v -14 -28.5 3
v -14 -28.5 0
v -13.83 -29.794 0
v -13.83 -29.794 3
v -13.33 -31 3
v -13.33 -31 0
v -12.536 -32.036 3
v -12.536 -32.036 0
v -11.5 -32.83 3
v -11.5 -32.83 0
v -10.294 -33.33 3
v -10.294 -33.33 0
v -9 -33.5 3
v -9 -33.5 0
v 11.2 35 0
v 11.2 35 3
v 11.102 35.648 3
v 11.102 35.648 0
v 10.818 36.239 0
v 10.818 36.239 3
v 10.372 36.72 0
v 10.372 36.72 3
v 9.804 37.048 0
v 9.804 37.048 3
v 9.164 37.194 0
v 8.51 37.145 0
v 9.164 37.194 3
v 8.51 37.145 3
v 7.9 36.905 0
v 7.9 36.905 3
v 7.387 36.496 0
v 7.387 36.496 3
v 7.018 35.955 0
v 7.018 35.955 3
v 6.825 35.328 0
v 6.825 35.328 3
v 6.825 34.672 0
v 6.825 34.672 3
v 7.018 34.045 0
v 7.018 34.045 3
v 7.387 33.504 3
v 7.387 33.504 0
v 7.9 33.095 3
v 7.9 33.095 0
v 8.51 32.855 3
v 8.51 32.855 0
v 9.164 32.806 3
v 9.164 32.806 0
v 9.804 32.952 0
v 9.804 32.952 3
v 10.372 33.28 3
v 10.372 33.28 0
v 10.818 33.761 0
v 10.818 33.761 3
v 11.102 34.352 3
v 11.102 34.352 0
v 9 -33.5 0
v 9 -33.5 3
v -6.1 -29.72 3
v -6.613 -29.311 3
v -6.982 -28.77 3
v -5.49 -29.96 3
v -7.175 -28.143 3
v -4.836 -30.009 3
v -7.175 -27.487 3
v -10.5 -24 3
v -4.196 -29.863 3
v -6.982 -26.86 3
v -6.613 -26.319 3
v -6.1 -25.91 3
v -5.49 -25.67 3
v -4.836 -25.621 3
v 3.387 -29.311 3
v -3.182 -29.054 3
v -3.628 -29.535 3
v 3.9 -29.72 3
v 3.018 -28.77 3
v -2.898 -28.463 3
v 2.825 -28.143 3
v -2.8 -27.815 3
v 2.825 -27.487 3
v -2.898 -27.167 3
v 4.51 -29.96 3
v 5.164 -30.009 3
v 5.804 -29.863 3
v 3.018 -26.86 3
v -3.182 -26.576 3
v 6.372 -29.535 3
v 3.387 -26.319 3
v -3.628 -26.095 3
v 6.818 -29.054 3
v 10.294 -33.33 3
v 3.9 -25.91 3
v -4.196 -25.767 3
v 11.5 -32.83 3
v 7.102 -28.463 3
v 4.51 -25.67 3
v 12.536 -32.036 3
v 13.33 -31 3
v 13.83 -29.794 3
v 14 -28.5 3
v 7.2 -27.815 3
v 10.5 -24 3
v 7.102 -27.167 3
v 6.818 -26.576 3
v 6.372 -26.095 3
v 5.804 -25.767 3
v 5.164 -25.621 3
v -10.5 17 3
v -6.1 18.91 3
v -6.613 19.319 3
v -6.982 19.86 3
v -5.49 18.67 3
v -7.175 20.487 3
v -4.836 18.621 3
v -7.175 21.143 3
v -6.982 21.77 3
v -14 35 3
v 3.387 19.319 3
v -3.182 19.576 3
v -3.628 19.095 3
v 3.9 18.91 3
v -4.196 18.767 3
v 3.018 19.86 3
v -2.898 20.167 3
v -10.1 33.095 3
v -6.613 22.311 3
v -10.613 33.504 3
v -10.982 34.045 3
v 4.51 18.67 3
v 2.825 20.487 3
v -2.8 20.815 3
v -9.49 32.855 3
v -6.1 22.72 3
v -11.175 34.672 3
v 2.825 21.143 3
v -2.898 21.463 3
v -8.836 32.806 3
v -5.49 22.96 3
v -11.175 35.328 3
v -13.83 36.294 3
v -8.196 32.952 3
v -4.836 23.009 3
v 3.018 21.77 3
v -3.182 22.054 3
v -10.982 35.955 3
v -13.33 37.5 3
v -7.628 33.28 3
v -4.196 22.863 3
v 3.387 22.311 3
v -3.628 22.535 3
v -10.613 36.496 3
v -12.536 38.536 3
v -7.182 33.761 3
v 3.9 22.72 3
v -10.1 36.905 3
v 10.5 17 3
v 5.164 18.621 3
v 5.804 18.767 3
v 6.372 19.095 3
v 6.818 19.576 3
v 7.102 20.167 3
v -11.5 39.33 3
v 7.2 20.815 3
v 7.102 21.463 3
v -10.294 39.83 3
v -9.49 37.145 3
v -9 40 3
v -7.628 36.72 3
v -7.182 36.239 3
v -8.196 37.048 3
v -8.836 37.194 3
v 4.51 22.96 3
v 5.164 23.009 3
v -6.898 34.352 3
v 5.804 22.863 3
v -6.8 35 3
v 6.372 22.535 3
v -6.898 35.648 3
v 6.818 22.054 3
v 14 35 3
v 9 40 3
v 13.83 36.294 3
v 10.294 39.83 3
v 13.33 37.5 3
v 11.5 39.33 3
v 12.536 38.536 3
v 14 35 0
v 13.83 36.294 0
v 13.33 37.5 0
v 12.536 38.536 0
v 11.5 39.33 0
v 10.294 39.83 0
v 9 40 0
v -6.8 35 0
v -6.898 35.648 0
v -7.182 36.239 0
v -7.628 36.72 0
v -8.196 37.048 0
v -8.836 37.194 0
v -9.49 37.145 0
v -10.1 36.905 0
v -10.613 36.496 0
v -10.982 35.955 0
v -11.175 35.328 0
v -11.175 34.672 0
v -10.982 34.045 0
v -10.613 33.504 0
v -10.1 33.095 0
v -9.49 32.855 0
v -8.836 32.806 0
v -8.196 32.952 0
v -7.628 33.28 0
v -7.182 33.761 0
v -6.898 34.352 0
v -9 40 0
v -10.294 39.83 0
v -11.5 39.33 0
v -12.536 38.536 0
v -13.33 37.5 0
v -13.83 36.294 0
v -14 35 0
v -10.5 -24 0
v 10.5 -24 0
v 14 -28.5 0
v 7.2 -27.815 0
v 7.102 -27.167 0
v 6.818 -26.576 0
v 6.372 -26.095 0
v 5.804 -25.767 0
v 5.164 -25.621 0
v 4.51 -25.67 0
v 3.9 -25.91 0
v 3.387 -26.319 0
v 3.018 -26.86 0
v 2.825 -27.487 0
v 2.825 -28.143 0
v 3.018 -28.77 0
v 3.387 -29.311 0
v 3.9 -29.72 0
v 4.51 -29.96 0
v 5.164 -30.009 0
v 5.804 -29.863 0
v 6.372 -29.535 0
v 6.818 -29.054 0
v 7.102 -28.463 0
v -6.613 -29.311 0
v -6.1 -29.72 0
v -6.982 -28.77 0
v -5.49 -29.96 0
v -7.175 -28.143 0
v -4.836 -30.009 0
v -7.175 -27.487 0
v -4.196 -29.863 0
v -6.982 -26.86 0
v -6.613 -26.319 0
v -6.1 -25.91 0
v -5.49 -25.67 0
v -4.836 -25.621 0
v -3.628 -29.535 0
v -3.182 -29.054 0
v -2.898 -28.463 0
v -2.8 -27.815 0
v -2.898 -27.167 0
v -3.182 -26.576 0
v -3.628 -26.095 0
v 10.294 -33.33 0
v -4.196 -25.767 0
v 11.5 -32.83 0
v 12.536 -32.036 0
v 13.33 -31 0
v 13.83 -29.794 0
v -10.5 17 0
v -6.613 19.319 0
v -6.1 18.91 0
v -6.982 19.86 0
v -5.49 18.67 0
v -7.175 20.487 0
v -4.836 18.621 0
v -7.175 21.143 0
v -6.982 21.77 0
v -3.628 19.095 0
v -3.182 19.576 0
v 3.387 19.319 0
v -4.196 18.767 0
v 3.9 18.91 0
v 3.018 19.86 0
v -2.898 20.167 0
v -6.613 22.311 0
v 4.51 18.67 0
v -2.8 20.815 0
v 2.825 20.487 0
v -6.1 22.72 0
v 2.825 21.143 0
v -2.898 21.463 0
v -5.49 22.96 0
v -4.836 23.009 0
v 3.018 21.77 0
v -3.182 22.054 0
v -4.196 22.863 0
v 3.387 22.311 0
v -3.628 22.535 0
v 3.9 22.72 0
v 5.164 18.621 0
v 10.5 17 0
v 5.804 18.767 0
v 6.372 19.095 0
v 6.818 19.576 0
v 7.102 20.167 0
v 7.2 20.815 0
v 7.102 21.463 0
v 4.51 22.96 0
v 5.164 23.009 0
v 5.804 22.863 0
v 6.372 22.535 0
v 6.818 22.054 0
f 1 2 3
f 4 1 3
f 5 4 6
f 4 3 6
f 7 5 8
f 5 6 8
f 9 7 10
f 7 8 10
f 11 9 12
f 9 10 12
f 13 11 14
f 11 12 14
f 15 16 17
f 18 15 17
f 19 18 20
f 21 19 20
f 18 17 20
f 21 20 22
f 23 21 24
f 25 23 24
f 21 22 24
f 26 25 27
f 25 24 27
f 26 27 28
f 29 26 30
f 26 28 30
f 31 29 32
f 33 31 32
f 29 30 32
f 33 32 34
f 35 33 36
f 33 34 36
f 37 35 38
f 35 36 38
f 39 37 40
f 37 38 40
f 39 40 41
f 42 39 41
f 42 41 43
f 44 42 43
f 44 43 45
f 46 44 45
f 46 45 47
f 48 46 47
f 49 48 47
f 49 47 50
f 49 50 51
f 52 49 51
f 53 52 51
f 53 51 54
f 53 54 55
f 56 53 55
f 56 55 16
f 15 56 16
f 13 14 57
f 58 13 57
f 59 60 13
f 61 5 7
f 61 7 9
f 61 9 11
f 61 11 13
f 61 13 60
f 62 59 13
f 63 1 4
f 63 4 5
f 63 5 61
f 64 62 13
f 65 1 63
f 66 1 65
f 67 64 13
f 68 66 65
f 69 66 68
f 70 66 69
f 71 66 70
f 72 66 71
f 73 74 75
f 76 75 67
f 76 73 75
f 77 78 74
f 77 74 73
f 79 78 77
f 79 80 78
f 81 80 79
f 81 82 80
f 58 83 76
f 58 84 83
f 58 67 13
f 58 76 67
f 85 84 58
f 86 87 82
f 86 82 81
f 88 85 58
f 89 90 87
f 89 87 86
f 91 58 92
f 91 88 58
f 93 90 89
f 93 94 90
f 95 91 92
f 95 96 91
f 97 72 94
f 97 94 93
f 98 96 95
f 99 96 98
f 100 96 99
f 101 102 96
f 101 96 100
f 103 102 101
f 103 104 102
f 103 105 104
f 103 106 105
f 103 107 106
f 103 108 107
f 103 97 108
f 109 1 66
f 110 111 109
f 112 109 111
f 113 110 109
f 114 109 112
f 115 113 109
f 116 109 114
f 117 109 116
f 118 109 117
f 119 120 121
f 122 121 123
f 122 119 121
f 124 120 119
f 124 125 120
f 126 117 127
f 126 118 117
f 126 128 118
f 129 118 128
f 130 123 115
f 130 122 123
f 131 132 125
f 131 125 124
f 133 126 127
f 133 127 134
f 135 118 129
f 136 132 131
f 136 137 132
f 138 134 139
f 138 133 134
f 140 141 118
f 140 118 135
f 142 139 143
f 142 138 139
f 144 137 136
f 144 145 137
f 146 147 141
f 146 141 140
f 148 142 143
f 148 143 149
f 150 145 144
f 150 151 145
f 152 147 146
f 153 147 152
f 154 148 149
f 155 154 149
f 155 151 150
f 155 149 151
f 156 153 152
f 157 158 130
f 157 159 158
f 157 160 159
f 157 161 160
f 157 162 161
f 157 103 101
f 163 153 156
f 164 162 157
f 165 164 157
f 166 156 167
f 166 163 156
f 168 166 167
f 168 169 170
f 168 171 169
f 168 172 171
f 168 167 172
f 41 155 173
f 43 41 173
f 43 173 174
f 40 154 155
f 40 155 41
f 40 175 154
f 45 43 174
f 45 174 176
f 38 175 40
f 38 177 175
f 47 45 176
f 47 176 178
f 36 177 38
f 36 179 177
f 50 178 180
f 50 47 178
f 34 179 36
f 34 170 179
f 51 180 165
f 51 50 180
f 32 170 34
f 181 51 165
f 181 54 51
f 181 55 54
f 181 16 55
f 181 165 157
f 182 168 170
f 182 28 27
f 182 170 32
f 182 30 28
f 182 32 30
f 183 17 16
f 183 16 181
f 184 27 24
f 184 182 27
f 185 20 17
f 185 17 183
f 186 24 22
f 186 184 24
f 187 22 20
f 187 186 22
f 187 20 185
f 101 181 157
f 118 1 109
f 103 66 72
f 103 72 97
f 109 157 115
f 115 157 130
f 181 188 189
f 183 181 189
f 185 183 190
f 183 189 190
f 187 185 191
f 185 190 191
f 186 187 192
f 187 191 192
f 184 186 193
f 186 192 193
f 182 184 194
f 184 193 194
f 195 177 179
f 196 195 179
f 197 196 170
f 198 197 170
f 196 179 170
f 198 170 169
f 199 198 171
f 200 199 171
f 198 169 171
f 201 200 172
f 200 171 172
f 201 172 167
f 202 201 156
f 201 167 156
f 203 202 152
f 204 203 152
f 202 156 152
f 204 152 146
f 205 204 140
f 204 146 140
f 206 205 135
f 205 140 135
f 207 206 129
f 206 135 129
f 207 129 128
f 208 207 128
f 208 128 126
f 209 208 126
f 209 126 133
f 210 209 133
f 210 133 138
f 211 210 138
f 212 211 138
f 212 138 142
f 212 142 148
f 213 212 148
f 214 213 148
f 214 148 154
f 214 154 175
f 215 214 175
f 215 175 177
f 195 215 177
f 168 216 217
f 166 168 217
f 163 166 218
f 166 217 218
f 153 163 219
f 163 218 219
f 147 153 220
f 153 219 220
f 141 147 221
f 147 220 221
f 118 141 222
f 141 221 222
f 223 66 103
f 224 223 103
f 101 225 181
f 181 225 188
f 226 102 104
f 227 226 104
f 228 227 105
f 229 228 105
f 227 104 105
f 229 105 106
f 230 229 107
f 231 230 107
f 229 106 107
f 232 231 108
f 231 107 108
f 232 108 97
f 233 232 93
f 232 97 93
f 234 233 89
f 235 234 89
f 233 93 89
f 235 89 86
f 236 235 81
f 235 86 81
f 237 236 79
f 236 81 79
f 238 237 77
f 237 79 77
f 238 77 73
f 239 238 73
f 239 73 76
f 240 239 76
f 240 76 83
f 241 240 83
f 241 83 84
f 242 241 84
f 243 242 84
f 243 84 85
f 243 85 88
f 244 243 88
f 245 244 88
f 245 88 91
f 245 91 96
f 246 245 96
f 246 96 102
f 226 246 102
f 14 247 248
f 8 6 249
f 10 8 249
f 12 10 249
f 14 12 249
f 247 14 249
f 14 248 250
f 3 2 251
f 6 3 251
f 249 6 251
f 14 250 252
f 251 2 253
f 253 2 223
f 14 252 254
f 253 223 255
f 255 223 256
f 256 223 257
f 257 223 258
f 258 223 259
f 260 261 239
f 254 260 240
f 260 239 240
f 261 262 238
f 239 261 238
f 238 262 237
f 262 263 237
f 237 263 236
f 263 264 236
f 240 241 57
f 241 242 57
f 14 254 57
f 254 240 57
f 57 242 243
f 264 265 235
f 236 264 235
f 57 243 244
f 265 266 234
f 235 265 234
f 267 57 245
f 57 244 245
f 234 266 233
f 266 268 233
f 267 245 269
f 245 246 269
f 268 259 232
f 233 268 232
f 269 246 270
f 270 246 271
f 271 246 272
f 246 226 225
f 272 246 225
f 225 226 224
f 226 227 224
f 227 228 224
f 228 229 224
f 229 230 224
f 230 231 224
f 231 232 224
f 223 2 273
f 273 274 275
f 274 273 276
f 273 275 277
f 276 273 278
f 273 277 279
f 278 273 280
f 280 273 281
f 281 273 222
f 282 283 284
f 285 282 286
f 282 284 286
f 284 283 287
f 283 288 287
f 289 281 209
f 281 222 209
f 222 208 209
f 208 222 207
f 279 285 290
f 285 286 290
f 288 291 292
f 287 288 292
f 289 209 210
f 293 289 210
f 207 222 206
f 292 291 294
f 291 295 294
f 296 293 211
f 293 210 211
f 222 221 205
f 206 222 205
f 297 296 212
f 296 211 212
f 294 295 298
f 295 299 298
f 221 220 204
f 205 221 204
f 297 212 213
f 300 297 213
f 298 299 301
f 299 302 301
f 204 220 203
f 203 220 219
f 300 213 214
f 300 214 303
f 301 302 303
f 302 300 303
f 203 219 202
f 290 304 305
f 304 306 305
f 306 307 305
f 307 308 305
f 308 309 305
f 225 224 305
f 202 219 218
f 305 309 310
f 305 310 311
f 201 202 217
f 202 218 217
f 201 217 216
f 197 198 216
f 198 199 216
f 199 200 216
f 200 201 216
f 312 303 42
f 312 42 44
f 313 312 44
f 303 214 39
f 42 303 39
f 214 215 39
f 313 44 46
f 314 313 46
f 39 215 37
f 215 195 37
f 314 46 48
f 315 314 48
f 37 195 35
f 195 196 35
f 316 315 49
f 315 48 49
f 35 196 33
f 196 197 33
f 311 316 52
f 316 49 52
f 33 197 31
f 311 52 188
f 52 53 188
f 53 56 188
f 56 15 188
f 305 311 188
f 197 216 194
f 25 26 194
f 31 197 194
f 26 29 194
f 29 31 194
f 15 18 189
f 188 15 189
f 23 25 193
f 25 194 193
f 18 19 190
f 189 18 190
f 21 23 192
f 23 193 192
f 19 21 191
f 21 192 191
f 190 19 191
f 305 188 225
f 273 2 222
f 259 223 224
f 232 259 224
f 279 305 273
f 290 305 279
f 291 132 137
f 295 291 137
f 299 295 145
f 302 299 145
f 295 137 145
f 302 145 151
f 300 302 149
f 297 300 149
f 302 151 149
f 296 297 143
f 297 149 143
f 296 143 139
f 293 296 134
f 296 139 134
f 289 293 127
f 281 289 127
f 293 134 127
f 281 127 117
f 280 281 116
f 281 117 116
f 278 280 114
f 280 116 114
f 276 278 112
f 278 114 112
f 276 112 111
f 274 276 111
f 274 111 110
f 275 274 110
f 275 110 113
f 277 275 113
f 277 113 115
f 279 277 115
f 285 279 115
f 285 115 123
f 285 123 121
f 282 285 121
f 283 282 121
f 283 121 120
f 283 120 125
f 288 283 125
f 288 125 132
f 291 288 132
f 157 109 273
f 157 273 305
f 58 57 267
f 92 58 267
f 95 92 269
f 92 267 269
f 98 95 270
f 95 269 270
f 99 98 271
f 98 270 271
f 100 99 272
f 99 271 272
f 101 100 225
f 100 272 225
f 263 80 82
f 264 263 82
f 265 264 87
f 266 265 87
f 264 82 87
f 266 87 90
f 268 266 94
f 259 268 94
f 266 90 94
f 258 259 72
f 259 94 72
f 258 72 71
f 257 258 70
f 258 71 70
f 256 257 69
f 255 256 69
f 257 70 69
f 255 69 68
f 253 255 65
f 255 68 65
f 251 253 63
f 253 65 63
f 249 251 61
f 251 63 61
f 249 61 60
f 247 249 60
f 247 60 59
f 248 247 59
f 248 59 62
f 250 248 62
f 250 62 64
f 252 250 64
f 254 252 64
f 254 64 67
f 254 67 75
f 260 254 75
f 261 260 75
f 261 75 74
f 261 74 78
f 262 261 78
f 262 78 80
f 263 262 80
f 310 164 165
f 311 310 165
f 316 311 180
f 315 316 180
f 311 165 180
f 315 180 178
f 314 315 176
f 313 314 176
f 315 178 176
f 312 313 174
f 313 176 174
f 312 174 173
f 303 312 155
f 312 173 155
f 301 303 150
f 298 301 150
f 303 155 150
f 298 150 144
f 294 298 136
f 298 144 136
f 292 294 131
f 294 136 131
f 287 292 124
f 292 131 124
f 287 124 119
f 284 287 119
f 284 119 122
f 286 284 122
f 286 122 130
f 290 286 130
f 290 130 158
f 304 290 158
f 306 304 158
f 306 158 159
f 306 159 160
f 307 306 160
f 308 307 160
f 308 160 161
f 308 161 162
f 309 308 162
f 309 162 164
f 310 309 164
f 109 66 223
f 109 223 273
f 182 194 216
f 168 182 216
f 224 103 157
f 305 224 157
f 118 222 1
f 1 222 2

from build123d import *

# Parameters (mm, degrees)
EXTRUDE_1_DEPTH     = 3
SKETCH_3_R          = 2.2
SKETCH_3_W          = 21
SKETCH_3_H          = 41
CUT_EXTRUDE_1_DEPTH = 4
SKETCH_4_R          = 2.2
CUT_EXTRUDE_2_DEPTH = 4


with BuildPart() as part:
    # 草图2 → 凸台-拉伸1 (new body)
    with BuildSketch(Plane.XY):
        with BuildLine():
            Line((-9, -33.5), (9, -33.5))
            ThreePointArc((9, -33.5), (12.535533906, -32.035533906), (14, -28.5))
            Line((14, -28.5), (14, 35))
            ThreePointArc((14, 35), (12.535533906, 38.535533906), (9, 40))
            Line((9, 40), (-9, 40))
            ThreePointArc((-9, 40), (-12.535533906, 38.535533906), (-14, 35))
            Line((-14, 35), (-14, -28.5))
            ThreePointArc((-14, -28.5), (-12.535533906, -32.035533906), (-9, -33.5))
        make_face()
    extrude(amount=EXTRUDE_1_DEPTH)

    # 草图3 → 切除-拉伸1 (cut, through all)
    with BuildSketch(Plane.XY.offset(3)):
        with Locations((-5, 20.815)):
            Circle(SKETCH_3_R)
        with Locations((-5, -27.815)):
            Circle(SKETCH_3_R)
        with Locations((0, -3.5)):
            Rectangle(SKETCH_3_W, SKETCH_3_H)
        with Locations((5, -27.815)):
            Circle(SKETCH_3_R)
        with Locations((5, 20.815)):
            Circle(SKETCH_3_R)
    extrude(amount=-CUT_EXTRUDE_1_DEPTH, mode=Mode.SUBTRACT)

    # 草图4 → 切除-拉伸2 (cut, through all)
    with BuildSketch(Plane.XY.offset(3)):
        with Locations((-9, 35)):
            Circle(SKETCH_4_R)
        with Locations((9, 35)):
            Circle(SKETCH_4_R)
    extrude(amount=-CUT_EXTRUDE_2_DEPTH, mode=Mode.SUBTRACT)


solid = part.part
